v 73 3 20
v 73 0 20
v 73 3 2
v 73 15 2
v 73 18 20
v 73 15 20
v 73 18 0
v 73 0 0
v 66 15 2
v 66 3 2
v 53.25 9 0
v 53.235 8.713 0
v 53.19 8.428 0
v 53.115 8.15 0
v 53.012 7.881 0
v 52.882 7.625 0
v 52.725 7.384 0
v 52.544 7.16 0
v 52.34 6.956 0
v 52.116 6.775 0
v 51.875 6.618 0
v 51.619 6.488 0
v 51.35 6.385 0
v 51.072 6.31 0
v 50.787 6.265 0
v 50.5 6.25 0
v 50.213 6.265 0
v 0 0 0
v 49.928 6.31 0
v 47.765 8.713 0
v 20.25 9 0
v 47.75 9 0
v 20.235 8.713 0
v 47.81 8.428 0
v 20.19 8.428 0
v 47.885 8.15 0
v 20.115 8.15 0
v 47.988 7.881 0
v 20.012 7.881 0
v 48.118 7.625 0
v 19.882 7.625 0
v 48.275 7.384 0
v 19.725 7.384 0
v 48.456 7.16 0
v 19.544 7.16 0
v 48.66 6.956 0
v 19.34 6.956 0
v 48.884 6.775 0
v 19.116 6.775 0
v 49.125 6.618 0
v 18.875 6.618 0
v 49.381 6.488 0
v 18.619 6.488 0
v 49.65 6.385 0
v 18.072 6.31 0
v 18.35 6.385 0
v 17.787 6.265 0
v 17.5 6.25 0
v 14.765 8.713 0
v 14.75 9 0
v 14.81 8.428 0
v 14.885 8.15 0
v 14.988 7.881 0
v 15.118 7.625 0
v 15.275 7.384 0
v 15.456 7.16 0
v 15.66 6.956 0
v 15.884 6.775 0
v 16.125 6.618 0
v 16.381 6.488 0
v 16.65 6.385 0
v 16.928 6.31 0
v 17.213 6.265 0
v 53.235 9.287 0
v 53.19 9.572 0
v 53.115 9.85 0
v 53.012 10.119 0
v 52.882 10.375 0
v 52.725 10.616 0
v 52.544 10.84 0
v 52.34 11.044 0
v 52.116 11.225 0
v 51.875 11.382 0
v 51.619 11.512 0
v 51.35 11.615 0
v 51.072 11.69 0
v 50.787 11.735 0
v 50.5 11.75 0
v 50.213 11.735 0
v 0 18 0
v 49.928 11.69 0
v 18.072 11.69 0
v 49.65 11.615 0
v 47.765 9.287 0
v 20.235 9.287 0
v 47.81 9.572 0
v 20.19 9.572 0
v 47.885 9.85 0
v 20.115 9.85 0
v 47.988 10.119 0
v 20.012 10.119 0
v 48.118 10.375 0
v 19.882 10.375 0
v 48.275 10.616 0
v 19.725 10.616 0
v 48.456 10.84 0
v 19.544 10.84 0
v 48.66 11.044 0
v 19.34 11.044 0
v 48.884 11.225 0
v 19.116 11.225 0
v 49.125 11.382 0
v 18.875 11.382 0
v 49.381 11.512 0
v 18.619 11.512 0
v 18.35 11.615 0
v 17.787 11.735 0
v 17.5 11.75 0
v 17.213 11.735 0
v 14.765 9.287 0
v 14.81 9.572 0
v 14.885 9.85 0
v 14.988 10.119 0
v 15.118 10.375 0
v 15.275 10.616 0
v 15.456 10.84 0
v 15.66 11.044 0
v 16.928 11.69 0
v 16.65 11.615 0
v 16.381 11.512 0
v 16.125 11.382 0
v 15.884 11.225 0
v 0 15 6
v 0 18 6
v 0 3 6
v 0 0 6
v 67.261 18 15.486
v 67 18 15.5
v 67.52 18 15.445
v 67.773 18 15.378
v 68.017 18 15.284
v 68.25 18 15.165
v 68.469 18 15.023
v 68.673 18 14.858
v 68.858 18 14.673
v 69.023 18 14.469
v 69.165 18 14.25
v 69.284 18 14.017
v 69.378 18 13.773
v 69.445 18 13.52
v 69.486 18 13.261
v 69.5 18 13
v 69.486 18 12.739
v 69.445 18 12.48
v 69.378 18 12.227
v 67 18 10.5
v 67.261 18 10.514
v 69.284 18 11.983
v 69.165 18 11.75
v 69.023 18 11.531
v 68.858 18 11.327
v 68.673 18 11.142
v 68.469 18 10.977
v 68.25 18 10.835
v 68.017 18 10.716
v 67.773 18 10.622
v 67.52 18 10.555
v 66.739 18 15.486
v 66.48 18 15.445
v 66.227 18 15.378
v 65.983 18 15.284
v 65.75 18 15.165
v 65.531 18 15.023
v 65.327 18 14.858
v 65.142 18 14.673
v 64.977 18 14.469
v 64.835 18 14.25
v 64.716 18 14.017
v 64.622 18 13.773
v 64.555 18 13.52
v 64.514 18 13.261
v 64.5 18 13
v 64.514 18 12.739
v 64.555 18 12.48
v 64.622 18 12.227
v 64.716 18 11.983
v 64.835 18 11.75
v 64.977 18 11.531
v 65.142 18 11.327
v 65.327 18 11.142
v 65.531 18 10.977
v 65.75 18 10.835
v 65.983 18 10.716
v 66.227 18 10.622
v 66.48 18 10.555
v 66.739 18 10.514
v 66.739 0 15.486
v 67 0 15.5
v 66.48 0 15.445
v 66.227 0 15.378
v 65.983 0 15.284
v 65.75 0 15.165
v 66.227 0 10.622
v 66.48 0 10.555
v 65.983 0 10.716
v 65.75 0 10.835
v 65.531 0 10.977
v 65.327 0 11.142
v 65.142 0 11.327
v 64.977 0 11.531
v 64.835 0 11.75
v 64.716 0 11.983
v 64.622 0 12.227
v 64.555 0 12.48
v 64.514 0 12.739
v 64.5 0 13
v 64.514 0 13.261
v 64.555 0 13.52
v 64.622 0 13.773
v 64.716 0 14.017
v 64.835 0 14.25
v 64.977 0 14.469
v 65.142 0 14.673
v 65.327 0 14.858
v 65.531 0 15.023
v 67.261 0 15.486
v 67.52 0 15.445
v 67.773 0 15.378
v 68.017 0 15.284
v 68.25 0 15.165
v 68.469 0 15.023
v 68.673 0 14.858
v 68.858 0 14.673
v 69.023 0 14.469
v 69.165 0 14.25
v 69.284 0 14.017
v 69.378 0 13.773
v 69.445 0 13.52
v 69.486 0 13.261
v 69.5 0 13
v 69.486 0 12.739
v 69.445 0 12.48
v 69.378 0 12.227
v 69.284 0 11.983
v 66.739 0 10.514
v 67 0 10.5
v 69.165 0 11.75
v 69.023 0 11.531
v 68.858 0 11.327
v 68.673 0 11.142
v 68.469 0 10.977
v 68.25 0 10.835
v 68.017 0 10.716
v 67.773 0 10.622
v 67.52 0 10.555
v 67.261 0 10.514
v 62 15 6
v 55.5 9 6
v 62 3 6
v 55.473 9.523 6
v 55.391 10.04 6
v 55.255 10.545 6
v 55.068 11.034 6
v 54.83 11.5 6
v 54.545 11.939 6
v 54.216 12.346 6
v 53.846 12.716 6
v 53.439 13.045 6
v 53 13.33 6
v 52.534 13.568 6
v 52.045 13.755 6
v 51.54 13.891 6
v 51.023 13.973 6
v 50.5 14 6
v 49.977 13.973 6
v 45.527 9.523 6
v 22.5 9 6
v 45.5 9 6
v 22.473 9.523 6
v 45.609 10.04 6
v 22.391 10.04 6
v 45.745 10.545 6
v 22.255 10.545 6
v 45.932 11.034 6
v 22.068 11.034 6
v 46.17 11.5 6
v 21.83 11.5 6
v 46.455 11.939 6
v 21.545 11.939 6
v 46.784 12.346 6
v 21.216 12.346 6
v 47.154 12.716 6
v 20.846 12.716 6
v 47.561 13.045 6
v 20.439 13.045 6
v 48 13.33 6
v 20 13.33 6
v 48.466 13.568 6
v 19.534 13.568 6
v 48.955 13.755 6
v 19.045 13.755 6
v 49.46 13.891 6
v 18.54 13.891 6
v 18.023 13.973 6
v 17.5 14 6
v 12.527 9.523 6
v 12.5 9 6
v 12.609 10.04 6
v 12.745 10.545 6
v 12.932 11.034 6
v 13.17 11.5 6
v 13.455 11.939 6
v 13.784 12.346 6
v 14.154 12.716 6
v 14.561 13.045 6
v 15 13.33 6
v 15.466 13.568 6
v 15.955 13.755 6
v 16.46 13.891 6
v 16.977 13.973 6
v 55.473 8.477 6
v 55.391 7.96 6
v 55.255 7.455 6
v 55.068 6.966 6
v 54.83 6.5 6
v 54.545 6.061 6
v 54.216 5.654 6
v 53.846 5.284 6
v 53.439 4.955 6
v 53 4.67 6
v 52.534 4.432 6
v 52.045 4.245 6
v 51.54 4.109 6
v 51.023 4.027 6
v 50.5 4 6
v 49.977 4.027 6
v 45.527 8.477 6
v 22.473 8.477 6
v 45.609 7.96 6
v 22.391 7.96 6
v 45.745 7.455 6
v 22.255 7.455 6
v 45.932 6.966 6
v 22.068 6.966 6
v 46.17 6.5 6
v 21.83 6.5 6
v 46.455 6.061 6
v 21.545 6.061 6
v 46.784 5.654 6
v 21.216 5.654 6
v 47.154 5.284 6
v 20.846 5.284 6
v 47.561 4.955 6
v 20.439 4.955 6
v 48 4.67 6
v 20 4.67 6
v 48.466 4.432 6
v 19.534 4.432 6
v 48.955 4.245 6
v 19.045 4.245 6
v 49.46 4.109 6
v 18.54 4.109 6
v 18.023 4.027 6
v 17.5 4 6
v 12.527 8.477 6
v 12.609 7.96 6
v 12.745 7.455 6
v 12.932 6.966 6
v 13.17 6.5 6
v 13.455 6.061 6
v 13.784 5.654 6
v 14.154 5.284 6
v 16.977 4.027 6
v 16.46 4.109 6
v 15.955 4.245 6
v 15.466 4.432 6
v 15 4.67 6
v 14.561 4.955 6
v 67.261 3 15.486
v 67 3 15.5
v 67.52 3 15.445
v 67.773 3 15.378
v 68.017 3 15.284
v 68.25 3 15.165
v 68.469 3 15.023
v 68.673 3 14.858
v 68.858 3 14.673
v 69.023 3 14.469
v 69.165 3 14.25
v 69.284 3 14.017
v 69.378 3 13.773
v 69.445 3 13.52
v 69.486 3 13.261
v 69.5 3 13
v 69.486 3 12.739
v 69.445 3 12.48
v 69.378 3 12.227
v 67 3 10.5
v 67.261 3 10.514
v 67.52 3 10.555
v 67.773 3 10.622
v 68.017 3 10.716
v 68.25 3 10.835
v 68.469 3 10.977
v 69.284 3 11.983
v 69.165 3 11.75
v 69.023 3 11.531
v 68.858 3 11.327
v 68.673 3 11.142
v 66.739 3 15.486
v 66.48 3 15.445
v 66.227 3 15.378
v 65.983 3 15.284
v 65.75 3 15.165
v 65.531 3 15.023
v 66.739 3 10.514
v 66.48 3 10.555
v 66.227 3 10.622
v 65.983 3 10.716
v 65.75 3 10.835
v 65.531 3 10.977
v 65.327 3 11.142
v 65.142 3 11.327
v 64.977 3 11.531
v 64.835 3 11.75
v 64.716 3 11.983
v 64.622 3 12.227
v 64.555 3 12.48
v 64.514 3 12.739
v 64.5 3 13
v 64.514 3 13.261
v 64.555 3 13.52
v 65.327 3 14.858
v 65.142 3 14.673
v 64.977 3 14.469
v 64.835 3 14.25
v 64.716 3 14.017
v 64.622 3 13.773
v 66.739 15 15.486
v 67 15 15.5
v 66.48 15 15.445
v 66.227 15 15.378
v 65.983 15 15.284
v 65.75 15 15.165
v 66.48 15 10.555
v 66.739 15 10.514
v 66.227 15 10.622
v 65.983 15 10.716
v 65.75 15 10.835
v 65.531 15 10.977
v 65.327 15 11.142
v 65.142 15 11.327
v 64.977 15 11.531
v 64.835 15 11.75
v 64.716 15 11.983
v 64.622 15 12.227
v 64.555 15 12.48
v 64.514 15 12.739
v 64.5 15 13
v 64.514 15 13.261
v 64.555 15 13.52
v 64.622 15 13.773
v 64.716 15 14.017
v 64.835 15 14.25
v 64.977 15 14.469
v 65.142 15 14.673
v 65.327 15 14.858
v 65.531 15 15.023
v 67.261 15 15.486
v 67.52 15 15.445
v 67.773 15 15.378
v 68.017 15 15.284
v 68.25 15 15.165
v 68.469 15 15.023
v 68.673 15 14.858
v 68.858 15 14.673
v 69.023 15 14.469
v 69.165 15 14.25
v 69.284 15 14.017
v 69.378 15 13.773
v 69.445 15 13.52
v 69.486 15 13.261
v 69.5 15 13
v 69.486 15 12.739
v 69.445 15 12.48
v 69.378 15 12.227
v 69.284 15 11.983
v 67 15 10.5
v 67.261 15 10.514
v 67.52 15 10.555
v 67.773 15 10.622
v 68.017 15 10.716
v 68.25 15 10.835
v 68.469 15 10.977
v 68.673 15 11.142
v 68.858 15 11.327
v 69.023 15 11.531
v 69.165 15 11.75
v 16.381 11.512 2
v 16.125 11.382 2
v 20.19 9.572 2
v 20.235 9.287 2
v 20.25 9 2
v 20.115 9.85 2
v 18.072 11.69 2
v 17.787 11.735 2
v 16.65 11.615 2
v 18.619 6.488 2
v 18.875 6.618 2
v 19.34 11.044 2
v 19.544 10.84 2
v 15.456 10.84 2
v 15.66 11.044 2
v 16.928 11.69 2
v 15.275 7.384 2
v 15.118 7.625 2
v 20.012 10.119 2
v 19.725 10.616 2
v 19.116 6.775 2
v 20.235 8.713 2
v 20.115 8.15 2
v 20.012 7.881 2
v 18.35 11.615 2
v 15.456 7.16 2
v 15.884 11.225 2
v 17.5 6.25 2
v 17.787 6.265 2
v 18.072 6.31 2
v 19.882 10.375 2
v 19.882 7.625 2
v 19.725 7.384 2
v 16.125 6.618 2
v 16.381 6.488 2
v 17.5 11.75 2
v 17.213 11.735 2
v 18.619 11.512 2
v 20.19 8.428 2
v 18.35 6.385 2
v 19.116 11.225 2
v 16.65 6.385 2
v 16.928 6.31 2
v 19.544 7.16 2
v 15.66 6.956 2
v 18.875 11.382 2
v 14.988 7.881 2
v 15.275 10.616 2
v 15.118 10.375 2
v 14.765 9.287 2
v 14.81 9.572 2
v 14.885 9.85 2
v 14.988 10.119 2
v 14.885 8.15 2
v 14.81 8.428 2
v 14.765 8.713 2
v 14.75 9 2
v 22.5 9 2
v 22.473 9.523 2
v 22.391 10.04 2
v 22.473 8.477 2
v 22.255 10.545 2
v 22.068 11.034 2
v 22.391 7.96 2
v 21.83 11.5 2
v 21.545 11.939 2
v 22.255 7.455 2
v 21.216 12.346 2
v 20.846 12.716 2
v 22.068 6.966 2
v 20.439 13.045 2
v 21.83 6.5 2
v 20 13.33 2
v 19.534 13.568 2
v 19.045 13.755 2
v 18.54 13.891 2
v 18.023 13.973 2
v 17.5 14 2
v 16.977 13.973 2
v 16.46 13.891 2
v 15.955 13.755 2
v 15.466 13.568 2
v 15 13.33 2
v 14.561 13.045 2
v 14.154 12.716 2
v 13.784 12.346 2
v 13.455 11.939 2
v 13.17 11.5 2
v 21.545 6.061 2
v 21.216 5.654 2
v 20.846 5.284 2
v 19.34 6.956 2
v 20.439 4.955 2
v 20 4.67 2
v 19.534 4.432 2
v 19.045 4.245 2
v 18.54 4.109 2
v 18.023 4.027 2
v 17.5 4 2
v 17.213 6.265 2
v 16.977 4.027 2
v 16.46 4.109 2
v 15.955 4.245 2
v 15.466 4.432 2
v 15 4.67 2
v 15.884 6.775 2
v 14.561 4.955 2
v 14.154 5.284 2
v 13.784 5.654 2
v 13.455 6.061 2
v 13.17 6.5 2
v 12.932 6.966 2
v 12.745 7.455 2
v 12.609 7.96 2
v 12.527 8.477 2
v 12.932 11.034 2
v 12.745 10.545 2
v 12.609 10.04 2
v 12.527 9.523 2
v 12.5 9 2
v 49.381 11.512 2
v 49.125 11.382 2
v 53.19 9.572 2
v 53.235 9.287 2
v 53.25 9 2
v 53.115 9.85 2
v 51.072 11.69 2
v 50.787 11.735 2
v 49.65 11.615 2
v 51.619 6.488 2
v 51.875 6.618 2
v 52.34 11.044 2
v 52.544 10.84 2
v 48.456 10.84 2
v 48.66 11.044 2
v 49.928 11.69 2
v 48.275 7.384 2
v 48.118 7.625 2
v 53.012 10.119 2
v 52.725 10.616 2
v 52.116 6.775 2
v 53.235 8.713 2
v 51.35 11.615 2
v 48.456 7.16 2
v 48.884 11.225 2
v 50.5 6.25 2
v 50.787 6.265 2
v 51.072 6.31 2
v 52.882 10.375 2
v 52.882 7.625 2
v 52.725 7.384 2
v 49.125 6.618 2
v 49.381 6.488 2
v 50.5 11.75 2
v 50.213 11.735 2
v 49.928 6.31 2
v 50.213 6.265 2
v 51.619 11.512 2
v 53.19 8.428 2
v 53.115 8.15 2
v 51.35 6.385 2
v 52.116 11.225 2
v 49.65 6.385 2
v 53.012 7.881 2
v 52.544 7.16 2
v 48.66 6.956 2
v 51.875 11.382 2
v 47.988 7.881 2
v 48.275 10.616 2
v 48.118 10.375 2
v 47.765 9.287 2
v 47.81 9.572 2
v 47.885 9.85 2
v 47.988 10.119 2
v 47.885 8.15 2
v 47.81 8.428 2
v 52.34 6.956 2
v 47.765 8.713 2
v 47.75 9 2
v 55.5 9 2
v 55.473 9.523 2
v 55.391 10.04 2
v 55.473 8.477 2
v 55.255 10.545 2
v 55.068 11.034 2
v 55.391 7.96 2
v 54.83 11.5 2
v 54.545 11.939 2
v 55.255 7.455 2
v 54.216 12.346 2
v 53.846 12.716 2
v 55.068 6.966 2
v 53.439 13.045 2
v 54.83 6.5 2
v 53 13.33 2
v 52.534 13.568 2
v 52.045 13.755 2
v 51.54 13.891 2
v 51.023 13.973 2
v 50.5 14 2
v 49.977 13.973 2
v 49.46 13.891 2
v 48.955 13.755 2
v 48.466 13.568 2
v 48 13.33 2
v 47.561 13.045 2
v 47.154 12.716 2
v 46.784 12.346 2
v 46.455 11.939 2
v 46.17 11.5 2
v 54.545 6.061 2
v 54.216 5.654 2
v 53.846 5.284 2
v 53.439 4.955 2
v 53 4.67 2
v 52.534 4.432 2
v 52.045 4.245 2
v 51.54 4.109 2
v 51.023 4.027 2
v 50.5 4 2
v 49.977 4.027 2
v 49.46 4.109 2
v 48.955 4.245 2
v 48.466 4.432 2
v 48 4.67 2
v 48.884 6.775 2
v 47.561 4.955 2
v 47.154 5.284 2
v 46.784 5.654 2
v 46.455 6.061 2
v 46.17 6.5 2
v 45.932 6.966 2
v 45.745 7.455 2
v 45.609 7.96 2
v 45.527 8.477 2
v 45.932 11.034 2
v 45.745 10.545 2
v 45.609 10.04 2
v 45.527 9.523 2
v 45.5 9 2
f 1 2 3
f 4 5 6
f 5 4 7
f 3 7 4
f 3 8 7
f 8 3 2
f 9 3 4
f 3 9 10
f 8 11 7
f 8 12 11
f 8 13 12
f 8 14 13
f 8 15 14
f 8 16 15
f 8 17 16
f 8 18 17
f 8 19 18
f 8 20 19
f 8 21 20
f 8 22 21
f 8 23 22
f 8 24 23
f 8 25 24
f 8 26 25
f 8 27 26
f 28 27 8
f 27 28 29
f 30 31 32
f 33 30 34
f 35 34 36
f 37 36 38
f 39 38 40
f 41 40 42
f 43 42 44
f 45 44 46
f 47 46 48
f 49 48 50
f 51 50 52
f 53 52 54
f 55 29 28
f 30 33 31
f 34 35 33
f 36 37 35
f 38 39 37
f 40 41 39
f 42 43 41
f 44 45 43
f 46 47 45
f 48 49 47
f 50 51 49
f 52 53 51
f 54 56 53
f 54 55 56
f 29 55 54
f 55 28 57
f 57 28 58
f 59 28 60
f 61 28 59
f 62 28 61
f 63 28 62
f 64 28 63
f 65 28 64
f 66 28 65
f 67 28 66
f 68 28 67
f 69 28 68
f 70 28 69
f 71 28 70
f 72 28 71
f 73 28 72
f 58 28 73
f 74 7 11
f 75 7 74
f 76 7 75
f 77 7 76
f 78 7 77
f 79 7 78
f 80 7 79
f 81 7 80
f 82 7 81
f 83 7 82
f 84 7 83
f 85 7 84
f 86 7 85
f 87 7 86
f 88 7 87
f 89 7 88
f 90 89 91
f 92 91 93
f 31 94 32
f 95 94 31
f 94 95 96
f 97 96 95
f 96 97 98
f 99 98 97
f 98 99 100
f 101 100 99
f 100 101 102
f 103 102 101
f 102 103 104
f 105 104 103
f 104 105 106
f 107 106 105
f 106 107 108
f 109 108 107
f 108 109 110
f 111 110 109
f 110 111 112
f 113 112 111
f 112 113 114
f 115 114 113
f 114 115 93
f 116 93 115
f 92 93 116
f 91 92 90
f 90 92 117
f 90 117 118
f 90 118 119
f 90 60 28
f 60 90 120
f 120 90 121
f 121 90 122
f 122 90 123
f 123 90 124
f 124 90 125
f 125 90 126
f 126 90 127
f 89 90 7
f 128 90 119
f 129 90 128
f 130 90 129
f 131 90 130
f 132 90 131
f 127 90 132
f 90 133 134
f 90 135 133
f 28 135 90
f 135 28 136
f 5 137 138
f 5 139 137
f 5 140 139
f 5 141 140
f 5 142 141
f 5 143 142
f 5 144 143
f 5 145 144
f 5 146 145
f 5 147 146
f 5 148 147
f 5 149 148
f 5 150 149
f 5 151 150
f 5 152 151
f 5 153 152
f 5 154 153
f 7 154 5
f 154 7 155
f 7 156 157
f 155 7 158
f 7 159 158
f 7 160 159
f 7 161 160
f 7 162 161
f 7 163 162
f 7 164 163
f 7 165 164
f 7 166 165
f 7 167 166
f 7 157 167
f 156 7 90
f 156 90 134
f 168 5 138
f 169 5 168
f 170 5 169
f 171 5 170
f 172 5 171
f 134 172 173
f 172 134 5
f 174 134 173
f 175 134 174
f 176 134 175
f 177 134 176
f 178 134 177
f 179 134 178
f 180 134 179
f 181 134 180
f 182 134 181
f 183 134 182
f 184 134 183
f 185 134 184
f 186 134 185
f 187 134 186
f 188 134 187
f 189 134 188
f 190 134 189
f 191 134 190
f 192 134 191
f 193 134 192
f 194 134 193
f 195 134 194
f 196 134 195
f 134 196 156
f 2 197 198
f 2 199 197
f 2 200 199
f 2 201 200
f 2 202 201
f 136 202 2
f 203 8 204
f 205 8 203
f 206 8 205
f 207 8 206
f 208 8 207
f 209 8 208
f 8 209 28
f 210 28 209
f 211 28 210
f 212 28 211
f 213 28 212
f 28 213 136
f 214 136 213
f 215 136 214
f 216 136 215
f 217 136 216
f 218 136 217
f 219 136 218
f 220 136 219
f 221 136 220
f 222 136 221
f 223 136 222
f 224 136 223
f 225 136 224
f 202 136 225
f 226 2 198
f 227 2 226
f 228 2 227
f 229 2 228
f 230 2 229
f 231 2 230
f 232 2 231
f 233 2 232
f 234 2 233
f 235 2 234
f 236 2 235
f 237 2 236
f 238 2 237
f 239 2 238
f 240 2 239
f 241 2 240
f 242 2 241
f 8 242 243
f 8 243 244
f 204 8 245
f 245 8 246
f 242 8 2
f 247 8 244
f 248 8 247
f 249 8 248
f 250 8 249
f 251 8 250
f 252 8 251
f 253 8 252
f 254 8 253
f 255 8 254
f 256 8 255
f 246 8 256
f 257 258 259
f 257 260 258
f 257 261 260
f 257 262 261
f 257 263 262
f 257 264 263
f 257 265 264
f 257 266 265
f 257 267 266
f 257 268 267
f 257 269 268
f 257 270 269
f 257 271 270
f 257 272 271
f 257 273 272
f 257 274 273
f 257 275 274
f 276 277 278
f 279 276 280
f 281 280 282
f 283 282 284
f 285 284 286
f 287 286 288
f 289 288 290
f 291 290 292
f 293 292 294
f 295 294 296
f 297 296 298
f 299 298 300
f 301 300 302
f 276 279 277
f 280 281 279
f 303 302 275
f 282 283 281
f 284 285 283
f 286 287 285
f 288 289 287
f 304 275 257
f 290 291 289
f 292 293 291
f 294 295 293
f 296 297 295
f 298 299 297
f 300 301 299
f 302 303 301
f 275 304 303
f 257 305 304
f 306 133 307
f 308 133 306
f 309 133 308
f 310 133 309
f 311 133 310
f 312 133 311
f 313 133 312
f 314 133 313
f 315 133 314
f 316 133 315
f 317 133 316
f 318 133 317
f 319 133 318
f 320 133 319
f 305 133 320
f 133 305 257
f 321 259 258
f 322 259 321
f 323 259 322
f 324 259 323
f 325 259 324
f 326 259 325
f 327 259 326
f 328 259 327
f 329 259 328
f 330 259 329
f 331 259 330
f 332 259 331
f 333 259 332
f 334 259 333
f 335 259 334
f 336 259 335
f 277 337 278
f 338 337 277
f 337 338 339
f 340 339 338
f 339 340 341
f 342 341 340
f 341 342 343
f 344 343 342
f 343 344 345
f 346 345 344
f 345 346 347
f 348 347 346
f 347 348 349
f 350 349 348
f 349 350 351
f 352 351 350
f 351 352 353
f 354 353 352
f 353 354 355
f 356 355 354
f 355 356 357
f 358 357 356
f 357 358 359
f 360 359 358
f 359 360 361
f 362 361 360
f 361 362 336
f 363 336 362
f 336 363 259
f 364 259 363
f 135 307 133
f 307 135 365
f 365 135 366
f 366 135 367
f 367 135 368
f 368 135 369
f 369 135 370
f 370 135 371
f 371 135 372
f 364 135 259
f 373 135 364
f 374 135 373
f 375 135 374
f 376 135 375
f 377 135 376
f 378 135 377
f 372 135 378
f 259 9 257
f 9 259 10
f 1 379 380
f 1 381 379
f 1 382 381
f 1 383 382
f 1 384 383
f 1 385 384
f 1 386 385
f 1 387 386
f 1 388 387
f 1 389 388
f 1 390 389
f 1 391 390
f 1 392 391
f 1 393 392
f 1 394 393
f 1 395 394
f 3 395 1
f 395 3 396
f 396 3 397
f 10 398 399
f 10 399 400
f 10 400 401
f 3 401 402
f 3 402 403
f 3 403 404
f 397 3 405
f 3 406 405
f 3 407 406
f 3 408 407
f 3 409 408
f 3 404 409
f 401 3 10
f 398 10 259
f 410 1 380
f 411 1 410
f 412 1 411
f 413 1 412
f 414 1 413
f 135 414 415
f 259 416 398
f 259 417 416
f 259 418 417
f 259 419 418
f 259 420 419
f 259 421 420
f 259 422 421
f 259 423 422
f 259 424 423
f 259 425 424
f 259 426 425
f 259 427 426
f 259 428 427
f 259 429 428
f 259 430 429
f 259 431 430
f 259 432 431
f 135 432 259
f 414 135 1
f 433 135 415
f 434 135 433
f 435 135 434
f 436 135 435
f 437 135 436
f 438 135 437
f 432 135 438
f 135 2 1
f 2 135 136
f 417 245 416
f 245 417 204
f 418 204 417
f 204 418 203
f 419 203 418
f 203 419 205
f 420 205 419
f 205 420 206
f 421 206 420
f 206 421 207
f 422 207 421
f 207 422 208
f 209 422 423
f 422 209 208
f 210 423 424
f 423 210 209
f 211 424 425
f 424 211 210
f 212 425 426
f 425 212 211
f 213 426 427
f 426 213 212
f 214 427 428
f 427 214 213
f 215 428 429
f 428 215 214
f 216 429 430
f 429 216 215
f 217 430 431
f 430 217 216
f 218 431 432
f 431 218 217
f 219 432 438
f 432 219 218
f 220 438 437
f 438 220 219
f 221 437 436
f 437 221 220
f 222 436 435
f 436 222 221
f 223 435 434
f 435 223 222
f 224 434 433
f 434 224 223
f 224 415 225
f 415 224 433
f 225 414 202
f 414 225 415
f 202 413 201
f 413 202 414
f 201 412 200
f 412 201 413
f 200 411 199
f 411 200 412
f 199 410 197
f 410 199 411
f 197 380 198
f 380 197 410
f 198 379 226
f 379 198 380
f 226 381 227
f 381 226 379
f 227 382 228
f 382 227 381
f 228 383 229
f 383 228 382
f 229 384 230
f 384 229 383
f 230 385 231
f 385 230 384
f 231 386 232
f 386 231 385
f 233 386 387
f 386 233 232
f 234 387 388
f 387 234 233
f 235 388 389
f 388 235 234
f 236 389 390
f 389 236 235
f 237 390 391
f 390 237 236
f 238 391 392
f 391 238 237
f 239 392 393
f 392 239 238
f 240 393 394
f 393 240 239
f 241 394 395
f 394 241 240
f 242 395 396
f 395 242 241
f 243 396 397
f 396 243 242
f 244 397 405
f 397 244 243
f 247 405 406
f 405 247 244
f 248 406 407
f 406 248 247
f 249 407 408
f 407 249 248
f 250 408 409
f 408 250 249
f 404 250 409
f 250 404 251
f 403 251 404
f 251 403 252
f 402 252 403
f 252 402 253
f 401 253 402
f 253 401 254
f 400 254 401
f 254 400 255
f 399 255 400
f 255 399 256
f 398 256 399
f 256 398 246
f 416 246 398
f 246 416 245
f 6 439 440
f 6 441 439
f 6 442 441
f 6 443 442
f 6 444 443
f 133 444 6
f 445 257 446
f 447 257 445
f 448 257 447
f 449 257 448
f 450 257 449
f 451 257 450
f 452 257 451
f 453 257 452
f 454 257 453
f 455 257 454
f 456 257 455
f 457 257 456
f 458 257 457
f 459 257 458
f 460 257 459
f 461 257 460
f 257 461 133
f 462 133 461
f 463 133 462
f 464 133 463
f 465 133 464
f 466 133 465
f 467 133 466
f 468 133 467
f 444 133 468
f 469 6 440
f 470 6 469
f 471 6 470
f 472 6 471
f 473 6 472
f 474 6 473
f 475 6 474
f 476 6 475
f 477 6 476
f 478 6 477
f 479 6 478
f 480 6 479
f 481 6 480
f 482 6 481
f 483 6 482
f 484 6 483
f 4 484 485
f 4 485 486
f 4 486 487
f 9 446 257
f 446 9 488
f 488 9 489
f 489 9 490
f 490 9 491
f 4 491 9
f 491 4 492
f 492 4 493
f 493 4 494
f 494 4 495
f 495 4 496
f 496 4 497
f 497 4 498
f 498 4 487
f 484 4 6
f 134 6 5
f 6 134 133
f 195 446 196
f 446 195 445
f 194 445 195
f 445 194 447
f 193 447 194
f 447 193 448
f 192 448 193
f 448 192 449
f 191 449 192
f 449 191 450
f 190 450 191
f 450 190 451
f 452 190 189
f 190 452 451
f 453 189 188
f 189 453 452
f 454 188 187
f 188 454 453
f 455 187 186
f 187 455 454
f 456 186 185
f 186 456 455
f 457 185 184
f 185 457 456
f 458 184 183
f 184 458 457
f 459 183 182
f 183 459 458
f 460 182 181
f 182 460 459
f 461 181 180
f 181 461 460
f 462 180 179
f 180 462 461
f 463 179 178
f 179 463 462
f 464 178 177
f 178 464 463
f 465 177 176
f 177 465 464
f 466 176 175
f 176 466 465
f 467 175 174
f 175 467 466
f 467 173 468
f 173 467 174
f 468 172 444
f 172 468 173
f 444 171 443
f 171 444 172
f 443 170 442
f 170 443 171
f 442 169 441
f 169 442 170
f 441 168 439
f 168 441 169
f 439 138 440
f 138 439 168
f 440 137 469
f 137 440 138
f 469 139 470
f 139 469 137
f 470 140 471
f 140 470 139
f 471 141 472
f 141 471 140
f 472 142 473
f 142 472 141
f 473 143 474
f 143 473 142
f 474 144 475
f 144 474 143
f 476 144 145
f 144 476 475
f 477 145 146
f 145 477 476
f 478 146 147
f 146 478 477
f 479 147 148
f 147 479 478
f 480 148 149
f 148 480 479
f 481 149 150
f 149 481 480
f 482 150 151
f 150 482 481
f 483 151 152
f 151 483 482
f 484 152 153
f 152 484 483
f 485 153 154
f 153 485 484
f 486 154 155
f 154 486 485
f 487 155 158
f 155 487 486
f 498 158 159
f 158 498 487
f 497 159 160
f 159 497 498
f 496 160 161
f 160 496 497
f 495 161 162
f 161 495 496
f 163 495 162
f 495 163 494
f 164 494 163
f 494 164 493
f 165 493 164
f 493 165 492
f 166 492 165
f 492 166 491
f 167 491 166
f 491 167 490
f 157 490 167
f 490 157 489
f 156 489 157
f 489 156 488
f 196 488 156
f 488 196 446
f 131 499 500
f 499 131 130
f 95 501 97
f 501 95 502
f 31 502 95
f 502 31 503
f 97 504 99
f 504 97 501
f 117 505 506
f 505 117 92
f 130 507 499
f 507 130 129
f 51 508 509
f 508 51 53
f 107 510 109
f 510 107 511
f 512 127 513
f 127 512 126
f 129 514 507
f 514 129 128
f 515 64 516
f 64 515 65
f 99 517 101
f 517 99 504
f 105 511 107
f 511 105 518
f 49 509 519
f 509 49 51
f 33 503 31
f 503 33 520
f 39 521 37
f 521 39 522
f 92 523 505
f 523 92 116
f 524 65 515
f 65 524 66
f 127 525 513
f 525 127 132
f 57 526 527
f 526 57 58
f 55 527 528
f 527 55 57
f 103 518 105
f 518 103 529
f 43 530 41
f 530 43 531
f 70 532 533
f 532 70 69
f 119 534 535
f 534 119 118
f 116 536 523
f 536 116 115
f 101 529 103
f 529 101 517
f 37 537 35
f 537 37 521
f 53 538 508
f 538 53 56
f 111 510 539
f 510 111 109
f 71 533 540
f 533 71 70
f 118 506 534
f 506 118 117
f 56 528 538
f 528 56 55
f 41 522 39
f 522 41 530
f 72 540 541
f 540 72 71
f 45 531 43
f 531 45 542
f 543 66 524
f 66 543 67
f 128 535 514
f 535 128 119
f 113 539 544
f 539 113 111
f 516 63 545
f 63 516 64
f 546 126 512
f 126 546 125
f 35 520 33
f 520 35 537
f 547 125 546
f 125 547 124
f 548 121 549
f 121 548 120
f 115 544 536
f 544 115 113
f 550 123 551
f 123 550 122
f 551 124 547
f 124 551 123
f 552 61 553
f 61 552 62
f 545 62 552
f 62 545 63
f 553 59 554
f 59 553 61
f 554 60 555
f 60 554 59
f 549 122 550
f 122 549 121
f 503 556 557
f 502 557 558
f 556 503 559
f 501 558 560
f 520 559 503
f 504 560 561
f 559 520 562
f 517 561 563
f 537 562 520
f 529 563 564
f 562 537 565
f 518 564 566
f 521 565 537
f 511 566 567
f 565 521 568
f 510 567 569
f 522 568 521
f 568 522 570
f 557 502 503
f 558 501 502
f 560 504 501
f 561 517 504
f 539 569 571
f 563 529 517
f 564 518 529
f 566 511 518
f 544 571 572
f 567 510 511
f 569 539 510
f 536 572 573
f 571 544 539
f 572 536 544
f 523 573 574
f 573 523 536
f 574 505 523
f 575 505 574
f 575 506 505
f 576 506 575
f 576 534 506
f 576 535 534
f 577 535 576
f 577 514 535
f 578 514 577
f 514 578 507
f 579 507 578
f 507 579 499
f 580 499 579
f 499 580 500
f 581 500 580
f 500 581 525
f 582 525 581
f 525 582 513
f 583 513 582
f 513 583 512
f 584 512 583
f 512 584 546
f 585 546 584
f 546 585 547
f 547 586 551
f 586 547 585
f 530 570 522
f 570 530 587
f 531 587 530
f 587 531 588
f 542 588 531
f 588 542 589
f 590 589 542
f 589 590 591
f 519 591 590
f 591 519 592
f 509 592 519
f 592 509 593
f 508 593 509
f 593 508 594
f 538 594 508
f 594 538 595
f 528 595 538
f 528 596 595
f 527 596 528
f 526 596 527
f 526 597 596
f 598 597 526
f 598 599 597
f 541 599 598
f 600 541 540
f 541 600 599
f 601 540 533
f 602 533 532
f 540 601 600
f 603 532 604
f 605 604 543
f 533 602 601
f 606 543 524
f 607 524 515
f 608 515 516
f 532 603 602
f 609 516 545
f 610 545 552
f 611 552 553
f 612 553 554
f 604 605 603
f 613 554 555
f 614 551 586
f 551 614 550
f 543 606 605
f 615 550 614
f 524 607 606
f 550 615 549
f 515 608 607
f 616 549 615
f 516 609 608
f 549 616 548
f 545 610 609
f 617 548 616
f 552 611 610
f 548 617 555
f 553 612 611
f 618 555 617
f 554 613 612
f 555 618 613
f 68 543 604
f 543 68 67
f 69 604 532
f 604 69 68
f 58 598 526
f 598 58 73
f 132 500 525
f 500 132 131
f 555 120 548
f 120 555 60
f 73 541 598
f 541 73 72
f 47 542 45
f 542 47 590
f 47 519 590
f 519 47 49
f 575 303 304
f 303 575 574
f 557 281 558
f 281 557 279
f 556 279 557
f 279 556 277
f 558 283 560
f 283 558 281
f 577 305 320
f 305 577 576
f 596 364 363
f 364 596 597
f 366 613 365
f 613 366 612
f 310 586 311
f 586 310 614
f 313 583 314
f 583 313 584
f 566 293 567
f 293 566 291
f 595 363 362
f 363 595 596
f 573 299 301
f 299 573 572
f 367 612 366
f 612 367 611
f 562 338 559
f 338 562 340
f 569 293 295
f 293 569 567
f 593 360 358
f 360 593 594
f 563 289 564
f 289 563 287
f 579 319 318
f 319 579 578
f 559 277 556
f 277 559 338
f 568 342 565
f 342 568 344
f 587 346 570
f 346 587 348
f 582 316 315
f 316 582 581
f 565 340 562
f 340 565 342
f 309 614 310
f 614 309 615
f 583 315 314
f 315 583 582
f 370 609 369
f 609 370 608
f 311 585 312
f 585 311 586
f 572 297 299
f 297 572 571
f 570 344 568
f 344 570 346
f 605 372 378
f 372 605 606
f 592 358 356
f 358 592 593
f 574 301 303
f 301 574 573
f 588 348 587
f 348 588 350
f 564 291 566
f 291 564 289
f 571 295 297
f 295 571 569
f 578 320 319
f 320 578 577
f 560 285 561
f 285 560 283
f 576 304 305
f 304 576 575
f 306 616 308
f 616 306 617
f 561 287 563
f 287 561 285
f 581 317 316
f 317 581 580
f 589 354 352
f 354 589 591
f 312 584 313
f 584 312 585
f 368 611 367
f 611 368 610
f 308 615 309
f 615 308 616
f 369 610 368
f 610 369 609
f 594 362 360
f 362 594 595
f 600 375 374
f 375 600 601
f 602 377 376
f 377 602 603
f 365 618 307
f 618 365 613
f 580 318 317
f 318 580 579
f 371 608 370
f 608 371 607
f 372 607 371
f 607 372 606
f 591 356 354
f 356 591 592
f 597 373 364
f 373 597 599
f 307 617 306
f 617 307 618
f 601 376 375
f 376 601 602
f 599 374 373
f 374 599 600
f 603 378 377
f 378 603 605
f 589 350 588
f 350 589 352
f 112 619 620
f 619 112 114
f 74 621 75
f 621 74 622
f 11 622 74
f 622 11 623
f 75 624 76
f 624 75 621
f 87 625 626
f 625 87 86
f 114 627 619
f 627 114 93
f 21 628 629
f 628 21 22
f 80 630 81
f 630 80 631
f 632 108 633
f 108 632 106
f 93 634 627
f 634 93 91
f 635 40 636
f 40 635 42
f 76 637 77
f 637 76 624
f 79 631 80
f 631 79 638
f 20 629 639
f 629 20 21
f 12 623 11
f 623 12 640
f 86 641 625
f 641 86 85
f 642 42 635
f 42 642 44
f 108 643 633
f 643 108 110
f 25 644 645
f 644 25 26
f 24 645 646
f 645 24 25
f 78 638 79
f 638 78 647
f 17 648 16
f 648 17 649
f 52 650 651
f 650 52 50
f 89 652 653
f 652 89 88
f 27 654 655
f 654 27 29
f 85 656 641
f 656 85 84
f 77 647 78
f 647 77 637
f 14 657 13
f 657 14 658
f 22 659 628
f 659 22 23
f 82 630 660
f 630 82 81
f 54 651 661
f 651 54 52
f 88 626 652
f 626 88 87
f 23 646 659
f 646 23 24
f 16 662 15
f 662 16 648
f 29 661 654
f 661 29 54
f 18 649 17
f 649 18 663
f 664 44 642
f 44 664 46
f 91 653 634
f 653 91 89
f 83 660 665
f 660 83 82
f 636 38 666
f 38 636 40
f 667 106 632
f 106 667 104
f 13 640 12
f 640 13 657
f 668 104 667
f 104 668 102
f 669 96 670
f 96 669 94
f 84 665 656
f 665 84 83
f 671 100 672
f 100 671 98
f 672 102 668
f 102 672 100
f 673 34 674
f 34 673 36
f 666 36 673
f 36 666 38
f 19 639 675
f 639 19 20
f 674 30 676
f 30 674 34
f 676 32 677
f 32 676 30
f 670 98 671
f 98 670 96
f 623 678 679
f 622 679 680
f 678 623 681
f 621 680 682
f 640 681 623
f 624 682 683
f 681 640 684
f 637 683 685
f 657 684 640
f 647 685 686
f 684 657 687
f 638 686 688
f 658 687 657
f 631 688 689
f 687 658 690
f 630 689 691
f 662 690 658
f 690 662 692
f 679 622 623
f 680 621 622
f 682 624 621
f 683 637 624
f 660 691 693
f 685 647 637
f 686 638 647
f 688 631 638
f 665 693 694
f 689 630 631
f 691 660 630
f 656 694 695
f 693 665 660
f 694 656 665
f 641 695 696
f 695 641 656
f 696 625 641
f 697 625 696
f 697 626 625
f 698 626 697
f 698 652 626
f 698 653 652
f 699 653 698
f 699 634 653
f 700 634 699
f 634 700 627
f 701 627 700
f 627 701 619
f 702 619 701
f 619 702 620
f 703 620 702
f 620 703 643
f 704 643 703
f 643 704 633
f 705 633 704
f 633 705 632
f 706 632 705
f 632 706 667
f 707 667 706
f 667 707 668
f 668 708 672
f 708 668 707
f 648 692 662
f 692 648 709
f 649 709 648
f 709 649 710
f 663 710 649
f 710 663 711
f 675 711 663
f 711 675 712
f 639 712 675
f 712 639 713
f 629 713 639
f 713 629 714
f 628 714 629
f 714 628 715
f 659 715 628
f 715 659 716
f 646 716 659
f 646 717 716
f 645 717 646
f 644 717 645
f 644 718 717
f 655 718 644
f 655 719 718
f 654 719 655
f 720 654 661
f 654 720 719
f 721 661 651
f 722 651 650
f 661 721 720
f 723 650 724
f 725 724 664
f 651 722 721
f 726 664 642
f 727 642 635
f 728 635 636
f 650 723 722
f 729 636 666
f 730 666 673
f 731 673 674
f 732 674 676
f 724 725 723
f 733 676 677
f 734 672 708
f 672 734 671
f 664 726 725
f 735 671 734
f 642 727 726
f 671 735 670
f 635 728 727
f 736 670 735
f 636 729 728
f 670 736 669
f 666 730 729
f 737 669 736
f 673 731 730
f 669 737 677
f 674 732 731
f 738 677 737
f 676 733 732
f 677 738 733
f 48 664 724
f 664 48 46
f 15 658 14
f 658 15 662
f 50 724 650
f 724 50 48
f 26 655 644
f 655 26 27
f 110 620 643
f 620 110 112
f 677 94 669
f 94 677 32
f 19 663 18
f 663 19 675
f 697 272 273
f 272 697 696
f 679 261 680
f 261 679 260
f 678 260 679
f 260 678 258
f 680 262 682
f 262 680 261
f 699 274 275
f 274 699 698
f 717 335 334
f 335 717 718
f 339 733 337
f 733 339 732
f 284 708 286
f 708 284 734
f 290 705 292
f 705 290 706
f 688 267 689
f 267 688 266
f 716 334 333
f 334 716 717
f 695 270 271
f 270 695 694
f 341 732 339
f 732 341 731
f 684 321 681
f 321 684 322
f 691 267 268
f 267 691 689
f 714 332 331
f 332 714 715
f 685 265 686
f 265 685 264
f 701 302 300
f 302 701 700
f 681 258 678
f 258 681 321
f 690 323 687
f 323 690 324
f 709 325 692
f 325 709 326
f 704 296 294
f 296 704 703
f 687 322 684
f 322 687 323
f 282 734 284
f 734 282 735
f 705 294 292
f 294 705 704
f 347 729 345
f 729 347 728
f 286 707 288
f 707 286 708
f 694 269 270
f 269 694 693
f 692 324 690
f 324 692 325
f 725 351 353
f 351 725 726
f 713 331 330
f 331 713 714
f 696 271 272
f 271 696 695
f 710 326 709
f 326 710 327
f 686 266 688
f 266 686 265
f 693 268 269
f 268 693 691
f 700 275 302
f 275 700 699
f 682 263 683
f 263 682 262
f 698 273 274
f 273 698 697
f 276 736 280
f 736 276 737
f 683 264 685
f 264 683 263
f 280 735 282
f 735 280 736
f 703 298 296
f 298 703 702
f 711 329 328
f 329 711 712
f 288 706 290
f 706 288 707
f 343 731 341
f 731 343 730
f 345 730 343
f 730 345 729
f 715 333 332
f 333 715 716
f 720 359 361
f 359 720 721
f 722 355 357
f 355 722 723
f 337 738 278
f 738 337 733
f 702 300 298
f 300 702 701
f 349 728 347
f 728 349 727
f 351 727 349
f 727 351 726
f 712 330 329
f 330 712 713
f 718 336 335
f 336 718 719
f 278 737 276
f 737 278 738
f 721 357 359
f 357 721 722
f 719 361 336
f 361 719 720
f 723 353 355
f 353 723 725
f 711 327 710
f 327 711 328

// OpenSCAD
$fn = 60;

module wing() {
    translate([0,3,0])
        rotate([90,0,0])
            linear_extrude(3)
                difference() {
                    polygon([
                        [0, 0],
                        [73, 0],
                        [73, 20],
                        [0, 6]
                    ]);
                    translate([67, 13, 0])
                        circle(2.5);
                }
}

module screws() {
    // Screw head is 9.5mm diameter (r=4.25)
    // Screws are 42.5mm apart (measured from far edges)
    //  --> Screw holes are 33mm apart (42.5 - 4.25 - 4.25)
    module screw() {
        cylinder(2, d=5.5);
        translate([0,0,2])
            cylinder(25, d=10);
    }
    screw();
    translate([33, 0, 0])
        screw();
}

module main() {
    module body() {    
        cube([73, 18, 2]);
        translate([0, 0, 2])
            cube([62, 18, 4]);
        translate([62, 18, 2])
            rotate([90,0,0])
                linear_extrude(18)
                    polygon([
                        [0, 0],
                        [4, 0],
                        [0, 4]
                    ]);
        wing();
        translate([0, 15, 0])
            wing();
    }
    difference() {
        body();
        translate([17.5, 9, 0])
            screws();
    }
    
}

main();
